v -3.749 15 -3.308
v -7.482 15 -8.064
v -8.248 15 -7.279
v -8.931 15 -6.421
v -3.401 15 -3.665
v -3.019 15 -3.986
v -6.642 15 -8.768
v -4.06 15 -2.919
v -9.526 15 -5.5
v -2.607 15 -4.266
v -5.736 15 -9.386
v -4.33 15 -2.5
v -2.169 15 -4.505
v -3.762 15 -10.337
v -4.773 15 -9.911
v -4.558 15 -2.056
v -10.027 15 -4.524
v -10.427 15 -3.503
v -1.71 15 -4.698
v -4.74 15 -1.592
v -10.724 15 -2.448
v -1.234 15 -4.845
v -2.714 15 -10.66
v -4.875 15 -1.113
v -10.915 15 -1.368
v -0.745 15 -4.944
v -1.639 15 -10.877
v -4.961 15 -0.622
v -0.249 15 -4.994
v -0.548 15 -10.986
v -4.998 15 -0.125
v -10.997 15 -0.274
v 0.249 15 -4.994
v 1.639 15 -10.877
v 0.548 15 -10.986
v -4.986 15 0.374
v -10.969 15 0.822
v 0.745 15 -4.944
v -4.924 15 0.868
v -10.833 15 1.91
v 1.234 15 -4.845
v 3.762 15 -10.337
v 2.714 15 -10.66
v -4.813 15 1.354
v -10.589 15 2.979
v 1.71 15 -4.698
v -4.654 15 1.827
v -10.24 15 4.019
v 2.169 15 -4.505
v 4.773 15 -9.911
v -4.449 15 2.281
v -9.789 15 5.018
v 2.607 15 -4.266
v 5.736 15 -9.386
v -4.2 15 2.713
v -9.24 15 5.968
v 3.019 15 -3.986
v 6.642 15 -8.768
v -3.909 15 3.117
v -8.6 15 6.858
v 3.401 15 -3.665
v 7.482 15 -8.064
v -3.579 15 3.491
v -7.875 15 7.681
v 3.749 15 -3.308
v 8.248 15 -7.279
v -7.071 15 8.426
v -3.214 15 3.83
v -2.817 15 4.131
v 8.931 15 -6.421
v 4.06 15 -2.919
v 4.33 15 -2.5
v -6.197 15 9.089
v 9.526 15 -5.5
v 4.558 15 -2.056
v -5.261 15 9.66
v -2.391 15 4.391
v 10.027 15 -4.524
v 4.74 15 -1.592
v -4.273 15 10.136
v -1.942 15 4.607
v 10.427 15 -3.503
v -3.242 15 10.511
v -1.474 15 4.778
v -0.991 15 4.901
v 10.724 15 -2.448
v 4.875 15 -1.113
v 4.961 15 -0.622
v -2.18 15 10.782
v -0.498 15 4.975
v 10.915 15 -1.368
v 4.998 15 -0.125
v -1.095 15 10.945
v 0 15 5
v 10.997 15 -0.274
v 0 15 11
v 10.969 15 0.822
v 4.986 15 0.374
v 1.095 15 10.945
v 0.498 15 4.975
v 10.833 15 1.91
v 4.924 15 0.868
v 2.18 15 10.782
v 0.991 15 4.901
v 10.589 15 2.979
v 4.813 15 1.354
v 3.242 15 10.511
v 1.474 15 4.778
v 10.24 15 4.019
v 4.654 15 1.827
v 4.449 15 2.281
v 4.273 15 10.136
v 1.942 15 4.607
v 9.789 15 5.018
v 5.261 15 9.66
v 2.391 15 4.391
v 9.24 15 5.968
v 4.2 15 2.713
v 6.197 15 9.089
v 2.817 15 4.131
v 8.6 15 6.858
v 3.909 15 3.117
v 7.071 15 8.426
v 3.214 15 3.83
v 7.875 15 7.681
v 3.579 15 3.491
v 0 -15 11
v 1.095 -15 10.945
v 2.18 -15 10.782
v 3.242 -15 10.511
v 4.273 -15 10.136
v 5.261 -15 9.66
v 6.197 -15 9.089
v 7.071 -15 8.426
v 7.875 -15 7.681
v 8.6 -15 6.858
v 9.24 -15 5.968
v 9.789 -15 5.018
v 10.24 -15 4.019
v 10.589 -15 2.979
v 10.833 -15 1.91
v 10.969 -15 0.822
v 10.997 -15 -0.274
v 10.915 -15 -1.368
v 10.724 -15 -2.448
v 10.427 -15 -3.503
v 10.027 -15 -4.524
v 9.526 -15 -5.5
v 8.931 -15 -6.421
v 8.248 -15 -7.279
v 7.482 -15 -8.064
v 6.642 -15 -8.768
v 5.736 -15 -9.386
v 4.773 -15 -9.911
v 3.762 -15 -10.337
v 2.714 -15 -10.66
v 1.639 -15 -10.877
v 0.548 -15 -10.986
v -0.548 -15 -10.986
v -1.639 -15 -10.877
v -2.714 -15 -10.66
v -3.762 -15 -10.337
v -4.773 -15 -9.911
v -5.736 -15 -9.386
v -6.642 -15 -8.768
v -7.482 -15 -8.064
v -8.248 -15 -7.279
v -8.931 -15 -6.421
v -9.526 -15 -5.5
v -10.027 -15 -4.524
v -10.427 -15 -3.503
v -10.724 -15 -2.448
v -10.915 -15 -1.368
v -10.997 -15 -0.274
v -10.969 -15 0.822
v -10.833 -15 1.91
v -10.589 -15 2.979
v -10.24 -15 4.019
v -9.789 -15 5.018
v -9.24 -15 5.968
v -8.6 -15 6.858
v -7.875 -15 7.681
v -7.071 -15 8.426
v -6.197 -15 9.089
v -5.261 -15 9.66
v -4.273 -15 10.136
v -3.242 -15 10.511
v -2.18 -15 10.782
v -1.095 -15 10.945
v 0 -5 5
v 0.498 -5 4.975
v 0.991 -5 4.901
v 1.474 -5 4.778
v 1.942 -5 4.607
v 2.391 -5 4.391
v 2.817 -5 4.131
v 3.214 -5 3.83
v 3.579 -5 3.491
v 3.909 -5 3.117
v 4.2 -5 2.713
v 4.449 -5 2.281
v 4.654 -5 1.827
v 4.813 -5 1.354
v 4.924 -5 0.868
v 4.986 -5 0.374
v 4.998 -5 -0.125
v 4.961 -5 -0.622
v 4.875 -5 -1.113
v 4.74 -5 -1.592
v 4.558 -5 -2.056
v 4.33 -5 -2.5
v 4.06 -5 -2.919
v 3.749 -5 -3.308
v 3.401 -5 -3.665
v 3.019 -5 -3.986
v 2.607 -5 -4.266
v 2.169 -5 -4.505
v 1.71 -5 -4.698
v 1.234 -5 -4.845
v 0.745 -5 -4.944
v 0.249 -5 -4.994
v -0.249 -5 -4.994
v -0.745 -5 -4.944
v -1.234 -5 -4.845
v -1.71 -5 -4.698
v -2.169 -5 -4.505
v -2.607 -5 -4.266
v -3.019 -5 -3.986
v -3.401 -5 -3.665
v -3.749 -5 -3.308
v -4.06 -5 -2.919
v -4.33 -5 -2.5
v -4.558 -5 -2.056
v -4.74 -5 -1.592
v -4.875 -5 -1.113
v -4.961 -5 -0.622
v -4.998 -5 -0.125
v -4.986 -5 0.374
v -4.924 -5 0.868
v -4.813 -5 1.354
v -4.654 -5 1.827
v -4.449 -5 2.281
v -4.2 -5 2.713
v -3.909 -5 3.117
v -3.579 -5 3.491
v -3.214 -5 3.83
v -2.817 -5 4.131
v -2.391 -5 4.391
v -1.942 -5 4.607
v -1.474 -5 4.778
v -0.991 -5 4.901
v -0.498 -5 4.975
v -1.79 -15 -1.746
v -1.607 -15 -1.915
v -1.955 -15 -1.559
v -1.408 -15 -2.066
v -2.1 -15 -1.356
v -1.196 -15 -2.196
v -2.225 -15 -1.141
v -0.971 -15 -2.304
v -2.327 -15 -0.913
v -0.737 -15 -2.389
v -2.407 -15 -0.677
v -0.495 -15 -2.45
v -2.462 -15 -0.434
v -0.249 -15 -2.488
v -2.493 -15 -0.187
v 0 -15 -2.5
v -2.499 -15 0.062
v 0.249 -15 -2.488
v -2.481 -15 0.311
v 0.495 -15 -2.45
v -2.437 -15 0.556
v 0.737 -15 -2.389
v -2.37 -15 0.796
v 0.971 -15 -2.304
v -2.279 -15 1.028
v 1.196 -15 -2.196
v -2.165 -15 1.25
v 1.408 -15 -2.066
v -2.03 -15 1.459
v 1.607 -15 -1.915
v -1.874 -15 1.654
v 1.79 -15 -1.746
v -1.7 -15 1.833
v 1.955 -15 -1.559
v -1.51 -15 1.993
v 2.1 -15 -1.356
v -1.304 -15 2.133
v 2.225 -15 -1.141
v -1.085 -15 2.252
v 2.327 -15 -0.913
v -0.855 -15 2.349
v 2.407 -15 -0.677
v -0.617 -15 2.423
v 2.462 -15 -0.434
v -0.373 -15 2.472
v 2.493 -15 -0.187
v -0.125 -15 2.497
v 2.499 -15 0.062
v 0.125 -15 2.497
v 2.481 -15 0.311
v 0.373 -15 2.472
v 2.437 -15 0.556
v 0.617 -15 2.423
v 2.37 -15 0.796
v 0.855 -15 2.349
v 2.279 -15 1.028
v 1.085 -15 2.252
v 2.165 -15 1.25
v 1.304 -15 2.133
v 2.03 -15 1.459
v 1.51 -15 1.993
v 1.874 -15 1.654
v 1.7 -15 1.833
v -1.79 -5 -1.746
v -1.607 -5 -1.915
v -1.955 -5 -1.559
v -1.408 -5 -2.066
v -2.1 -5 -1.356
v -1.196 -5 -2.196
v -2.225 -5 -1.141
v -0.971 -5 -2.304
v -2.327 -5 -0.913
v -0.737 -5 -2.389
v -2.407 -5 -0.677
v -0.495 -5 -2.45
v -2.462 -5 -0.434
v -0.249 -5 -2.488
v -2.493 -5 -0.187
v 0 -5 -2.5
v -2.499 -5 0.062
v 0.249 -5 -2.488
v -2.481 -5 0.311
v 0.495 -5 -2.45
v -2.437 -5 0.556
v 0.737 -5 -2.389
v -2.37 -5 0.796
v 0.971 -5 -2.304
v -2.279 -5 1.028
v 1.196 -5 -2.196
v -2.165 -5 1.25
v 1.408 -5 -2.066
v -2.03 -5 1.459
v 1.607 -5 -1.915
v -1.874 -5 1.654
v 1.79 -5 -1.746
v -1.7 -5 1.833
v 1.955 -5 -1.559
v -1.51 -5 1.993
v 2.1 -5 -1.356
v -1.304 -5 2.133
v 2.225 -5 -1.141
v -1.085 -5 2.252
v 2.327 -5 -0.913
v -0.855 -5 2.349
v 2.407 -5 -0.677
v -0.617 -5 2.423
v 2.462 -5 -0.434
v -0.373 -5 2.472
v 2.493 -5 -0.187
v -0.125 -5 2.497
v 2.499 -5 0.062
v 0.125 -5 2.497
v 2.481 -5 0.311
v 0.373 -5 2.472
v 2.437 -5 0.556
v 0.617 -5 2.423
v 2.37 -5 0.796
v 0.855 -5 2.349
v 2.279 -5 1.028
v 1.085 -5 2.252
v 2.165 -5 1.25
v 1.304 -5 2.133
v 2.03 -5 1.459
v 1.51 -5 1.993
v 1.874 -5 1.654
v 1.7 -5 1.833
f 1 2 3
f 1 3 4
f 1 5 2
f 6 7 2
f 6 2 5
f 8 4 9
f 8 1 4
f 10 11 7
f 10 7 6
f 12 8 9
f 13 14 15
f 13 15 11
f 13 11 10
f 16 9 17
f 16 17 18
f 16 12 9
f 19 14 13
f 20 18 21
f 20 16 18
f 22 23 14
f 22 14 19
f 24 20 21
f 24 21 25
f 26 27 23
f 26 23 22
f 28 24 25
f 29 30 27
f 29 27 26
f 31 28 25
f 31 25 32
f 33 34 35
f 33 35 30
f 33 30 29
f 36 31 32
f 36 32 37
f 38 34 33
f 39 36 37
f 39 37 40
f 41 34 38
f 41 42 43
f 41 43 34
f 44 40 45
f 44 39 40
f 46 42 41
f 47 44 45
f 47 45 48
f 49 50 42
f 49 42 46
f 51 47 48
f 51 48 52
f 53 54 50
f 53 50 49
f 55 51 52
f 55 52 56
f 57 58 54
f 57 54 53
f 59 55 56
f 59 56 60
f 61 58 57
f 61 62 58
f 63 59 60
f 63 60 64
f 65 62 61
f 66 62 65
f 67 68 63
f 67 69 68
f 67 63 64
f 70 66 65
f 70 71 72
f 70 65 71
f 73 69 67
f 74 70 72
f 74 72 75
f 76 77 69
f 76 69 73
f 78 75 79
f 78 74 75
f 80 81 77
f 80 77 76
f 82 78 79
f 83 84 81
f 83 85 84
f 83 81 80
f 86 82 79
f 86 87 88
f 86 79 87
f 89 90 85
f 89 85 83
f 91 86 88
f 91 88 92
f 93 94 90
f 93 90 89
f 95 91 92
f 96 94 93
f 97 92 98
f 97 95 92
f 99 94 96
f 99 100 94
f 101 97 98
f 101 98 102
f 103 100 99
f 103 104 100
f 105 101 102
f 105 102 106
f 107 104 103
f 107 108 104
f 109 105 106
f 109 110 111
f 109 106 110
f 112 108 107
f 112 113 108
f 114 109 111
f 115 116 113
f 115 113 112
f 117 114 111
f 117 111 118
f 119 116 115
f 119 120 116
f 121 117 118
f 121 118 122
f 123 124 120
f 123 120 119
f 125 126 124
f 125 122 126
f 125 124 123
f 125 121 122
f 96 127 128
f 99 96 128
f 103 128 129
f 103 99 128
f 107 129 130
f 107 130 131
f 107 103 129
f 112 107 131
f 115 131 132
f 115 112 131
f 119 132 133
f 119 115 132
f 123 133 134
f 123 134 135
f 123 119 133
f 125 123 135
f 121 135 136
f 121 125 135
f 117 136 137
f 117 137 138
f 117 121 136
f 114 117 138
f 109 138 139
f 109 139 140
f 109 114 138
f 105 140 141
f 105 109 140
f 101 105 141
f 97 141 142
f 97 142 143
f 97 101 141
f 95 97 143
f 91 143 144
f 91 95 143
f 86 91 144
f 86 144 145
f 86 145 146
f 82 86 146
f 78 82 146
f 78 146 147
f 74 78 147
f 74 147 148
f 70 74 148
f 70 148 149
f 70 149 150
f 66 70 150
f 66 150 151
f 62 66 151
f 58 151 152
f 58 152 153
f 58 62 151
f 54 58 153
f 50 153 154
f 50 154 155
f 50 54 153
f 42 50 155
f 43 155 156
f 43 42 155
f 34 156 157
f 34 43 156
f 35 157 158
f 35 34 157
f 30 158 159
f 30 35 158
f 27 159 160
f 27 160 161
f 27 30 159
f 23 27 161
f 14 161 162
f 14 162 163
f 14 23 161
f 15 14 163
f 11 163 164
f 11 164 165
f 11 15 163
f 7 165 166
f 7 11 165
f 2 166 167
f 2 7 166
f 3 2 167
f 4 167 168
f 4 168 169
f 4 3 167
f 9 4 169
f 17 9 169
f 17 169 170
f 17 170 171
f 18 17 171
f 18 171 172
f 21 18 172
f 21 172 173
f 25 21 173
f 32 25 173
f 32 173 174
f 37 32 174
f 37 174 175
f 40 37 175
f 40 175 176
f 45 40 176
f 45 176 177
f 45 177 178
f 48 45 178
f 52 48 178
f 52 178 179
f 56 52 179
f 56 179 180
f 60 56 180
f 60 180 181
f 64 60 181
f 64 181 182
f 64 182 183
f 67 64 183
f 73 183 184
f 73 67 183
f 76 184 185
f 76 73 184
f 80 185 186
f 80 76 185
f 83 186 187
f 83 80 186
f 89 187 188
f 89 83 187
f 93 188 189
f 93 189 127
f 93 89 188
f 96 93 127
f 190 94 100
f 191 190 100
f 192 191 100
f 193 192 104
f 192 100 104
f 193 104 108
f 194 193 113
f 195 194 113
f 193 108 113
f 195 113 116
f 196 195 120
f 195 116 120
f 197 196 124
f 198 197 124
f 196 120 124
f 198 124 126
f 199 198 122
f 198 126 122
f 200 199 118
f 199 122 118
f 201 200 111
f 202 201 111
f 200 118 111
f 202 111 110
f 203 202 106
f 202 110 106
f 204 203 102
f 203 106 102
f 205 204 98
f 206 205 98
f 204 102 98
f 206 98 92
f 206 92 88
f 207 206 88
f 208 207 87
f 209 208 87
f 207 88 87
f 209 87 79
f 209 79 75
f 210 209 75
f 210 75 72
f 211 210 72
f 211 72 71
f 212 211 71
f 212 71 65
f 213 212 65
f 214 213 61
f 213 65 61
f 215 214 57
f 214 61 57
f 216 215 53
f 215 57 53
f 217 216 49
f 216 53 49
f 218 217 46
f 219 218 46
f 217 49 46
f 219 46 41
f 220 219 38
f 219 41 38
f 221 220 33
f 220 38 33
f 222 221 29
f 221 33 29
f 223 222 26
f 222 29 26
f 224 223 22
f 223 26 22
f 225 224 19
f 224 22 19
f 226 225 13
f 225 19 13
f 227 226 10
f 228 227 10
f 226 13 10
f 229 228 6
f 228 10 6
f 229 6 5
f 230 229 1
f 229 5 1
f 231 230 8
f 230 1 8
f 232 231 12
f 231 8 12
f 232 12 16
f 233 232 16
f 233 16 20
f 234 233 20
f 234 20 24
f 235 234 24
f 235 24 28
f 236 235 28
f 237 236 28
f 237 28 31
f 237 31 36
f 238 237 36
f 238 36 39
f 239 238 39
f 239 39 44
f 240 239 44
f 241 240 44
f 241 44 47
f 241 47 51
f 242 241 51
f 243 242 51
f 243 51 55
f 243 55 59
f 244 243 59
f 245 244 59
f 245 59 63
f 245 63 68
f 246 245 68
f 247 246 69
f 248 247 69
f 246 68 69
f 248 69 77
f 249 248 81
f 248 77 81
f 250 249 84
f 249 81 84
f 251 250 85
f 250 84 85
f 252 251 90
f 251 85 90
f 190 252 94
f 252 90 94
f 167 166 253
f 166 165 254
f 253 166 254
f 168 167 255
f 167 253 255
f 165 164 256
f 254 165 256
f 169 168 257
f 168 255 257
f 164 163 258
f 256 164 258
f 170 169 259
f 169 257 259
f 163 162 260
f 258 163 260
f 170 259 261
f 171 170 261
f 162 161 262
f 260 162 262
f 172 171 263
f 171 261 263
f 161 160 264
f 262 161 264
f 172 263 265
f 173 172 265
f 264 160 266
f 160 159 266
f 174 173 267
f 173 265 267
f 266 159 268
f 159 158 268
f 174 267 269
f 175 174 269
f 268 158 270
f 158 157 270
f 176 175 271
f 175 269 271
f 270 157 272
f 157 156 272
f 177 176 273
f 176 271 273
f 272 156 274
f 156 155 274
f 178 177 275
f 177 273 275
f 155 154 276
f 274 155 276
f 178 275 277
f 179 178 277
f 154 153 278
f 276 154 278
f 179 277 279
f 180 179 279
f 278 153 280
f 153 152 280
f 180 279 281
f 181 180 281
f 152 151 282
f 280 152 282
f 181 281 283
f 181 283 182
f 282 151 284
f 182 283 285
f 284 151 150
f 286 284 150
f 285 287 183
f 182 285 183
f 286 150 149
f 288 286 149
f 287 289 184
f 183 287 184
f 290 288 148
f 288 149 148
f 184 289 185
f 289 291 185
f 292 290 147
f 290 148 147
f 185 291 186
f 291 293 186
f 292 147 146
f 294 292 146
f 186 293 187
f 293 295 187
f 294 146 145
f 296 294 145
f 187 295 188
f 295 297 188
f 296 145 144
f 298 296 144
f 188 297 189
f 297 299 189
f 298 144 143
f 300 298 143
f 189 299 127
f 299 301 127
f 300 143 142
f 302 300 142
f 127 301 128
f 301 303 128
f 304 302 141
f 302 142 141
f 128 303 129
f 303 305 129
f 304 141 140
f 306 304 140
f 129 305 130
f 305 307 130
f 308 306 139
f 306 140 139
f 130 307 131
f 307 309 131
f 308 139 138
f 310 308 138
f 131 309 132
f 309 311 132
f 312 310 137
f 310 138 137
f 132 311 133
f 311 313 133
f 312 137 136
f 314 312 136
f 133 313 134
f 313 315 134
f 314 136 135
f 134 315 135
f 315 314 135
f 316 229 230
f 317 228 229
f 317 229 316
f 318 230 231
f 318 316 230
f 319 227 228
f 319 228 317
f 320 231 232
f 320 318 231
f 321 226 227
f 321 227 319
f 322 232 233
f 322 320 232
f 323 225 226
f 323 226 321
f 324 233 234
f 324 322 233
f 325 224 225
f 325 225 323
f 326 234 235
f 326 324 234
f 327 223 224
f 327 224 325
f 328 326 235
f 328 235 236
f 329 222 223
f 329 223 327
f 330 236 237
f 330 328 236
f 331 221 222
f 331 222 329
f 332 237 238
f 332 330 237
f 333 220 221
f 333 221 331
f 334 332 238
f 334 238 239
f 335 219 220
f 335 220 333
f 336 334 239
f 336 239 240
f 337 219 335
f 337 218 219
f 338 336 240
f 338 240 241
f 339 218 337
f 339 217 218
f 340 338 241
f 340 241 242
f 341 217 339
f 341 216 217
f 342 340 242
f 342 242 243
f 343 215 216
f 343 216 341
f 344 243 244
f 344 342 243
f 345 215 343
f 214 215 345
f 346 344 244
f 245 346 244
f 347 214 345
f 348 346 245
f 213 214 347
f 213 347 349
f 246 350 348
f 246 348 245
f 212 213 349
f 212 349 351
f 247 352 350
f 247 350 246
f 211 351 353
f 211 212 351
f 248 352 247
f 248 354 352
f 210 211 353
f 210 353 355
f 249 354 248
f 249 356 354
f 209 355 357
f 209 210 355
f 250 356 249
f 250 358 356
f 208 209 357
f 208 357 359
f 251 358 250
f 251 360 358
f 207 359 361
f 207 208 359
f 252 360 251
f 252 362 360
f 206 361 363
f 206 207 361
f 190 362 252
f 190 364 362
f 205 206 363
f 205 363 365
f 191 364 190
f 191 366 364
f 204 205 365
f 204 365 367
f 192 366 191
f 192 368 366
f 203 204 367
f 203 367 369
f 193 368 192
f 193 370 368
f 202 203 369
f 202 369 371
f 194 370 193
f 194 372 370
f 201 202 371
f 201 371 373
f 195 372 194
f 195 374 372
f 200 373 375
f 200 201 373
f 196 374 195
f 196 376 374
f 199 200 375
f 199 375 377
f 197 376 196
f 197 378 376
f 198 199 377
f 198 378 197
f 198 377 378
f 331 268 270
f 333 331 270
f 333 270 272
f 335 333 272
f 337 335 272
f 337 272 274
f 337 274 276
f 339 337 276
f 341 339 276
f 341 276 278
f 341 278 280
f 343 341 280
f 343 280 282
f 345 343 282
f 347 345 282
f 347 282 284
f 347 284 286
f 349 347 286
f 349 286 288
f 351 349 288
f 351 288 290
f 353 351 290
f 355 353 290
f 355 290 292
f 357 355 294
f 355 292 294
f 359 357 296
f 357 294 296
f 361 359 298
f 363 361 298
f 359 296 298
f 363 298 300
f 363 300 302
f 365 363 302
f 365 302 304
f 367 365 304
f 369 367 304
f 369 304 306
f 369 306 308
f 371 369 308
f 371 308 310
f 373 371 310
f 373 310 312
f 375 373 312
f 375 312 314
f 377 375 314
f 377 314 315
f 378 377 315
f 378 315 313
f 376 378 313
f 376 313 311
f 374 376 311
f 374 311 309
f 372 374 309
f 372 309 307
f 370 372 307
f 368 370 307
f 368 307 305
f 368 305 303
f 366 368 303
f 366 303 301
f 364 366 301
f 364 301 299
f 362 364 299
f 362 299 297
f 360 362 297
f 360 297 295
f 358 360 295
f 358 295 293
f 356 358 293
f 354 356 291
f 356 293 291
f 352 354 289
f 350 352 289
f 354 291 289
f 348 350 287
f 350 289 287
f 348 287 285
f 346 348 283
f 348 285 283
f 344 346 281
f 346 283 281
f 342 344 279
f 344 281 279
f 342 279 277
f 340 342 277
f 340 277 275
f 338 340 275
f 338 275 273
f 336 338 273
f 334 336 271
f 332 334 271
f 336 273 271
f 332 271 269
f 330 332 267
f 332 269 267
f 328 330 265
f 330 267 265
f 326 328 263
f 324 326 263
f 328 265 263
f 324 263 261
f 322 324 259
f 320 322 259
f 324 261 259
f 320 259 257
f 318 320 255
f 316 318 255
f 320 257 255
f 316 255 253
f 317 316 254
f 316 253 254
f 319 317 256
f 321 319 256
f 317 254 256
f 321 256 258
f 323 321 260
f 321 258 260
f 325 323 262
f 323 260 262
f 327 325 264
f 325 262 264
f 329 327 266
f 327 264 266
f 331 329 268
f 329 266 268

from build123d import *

# Parameters (mm, degrees)
SKETCH_2_R          = 11
EXTRUDE_1_DEPTH     = 15
SKETCH_3_R          = 2.5
CUT_EXTRUDE_1_DEPTH = 34.793490497
SKETCH_4_R          = 5
CUT_EXTRUDE_2_DEPTH = 20


with BuildPart() as part:
    # 스케치2 → 보스-돌출1 (new, symmetric)
    with BuildSketch(Plane(origin=(0, 0, 0), x_dir=(1, 0, 0), z_dir=(0, 1, 0))):
        with Locations(Location((0, 0, 0), (0, 0, 270))):
            Circle(SKETCH_2_R)
    extrude(amount=EXTRUDE_1_DEPTH, both=True)

    # 스케치3 → 컷-돌출1 (cut, through all)
    with BuildSketch(Plane.XZ.offset(15)):
        with Locations(Location((0, 0, 0), (0, 0, 270))):
            Circle(SKETCH_3_R)
    extrude(amount=-CUT_EXTRUDE_1_DEPTH, mode=Mode.SUBTRACT)

    # 스케치4 → 컷-돌출2 (cut)
    with BuildSketch(Plane(origin=(0, 15, 0), x_dir=(1, 0, 0), z_dir=(0, 1, 0))):
        with Locations(Location((0, 0, 0), (0, 0, 270))):
            Circle(SKETCH_4_R)
    extrude(amount=-CUT_EXTRUDE_2_DEPTH, mode=Mode.SUBTRACT)


solid = part.part
